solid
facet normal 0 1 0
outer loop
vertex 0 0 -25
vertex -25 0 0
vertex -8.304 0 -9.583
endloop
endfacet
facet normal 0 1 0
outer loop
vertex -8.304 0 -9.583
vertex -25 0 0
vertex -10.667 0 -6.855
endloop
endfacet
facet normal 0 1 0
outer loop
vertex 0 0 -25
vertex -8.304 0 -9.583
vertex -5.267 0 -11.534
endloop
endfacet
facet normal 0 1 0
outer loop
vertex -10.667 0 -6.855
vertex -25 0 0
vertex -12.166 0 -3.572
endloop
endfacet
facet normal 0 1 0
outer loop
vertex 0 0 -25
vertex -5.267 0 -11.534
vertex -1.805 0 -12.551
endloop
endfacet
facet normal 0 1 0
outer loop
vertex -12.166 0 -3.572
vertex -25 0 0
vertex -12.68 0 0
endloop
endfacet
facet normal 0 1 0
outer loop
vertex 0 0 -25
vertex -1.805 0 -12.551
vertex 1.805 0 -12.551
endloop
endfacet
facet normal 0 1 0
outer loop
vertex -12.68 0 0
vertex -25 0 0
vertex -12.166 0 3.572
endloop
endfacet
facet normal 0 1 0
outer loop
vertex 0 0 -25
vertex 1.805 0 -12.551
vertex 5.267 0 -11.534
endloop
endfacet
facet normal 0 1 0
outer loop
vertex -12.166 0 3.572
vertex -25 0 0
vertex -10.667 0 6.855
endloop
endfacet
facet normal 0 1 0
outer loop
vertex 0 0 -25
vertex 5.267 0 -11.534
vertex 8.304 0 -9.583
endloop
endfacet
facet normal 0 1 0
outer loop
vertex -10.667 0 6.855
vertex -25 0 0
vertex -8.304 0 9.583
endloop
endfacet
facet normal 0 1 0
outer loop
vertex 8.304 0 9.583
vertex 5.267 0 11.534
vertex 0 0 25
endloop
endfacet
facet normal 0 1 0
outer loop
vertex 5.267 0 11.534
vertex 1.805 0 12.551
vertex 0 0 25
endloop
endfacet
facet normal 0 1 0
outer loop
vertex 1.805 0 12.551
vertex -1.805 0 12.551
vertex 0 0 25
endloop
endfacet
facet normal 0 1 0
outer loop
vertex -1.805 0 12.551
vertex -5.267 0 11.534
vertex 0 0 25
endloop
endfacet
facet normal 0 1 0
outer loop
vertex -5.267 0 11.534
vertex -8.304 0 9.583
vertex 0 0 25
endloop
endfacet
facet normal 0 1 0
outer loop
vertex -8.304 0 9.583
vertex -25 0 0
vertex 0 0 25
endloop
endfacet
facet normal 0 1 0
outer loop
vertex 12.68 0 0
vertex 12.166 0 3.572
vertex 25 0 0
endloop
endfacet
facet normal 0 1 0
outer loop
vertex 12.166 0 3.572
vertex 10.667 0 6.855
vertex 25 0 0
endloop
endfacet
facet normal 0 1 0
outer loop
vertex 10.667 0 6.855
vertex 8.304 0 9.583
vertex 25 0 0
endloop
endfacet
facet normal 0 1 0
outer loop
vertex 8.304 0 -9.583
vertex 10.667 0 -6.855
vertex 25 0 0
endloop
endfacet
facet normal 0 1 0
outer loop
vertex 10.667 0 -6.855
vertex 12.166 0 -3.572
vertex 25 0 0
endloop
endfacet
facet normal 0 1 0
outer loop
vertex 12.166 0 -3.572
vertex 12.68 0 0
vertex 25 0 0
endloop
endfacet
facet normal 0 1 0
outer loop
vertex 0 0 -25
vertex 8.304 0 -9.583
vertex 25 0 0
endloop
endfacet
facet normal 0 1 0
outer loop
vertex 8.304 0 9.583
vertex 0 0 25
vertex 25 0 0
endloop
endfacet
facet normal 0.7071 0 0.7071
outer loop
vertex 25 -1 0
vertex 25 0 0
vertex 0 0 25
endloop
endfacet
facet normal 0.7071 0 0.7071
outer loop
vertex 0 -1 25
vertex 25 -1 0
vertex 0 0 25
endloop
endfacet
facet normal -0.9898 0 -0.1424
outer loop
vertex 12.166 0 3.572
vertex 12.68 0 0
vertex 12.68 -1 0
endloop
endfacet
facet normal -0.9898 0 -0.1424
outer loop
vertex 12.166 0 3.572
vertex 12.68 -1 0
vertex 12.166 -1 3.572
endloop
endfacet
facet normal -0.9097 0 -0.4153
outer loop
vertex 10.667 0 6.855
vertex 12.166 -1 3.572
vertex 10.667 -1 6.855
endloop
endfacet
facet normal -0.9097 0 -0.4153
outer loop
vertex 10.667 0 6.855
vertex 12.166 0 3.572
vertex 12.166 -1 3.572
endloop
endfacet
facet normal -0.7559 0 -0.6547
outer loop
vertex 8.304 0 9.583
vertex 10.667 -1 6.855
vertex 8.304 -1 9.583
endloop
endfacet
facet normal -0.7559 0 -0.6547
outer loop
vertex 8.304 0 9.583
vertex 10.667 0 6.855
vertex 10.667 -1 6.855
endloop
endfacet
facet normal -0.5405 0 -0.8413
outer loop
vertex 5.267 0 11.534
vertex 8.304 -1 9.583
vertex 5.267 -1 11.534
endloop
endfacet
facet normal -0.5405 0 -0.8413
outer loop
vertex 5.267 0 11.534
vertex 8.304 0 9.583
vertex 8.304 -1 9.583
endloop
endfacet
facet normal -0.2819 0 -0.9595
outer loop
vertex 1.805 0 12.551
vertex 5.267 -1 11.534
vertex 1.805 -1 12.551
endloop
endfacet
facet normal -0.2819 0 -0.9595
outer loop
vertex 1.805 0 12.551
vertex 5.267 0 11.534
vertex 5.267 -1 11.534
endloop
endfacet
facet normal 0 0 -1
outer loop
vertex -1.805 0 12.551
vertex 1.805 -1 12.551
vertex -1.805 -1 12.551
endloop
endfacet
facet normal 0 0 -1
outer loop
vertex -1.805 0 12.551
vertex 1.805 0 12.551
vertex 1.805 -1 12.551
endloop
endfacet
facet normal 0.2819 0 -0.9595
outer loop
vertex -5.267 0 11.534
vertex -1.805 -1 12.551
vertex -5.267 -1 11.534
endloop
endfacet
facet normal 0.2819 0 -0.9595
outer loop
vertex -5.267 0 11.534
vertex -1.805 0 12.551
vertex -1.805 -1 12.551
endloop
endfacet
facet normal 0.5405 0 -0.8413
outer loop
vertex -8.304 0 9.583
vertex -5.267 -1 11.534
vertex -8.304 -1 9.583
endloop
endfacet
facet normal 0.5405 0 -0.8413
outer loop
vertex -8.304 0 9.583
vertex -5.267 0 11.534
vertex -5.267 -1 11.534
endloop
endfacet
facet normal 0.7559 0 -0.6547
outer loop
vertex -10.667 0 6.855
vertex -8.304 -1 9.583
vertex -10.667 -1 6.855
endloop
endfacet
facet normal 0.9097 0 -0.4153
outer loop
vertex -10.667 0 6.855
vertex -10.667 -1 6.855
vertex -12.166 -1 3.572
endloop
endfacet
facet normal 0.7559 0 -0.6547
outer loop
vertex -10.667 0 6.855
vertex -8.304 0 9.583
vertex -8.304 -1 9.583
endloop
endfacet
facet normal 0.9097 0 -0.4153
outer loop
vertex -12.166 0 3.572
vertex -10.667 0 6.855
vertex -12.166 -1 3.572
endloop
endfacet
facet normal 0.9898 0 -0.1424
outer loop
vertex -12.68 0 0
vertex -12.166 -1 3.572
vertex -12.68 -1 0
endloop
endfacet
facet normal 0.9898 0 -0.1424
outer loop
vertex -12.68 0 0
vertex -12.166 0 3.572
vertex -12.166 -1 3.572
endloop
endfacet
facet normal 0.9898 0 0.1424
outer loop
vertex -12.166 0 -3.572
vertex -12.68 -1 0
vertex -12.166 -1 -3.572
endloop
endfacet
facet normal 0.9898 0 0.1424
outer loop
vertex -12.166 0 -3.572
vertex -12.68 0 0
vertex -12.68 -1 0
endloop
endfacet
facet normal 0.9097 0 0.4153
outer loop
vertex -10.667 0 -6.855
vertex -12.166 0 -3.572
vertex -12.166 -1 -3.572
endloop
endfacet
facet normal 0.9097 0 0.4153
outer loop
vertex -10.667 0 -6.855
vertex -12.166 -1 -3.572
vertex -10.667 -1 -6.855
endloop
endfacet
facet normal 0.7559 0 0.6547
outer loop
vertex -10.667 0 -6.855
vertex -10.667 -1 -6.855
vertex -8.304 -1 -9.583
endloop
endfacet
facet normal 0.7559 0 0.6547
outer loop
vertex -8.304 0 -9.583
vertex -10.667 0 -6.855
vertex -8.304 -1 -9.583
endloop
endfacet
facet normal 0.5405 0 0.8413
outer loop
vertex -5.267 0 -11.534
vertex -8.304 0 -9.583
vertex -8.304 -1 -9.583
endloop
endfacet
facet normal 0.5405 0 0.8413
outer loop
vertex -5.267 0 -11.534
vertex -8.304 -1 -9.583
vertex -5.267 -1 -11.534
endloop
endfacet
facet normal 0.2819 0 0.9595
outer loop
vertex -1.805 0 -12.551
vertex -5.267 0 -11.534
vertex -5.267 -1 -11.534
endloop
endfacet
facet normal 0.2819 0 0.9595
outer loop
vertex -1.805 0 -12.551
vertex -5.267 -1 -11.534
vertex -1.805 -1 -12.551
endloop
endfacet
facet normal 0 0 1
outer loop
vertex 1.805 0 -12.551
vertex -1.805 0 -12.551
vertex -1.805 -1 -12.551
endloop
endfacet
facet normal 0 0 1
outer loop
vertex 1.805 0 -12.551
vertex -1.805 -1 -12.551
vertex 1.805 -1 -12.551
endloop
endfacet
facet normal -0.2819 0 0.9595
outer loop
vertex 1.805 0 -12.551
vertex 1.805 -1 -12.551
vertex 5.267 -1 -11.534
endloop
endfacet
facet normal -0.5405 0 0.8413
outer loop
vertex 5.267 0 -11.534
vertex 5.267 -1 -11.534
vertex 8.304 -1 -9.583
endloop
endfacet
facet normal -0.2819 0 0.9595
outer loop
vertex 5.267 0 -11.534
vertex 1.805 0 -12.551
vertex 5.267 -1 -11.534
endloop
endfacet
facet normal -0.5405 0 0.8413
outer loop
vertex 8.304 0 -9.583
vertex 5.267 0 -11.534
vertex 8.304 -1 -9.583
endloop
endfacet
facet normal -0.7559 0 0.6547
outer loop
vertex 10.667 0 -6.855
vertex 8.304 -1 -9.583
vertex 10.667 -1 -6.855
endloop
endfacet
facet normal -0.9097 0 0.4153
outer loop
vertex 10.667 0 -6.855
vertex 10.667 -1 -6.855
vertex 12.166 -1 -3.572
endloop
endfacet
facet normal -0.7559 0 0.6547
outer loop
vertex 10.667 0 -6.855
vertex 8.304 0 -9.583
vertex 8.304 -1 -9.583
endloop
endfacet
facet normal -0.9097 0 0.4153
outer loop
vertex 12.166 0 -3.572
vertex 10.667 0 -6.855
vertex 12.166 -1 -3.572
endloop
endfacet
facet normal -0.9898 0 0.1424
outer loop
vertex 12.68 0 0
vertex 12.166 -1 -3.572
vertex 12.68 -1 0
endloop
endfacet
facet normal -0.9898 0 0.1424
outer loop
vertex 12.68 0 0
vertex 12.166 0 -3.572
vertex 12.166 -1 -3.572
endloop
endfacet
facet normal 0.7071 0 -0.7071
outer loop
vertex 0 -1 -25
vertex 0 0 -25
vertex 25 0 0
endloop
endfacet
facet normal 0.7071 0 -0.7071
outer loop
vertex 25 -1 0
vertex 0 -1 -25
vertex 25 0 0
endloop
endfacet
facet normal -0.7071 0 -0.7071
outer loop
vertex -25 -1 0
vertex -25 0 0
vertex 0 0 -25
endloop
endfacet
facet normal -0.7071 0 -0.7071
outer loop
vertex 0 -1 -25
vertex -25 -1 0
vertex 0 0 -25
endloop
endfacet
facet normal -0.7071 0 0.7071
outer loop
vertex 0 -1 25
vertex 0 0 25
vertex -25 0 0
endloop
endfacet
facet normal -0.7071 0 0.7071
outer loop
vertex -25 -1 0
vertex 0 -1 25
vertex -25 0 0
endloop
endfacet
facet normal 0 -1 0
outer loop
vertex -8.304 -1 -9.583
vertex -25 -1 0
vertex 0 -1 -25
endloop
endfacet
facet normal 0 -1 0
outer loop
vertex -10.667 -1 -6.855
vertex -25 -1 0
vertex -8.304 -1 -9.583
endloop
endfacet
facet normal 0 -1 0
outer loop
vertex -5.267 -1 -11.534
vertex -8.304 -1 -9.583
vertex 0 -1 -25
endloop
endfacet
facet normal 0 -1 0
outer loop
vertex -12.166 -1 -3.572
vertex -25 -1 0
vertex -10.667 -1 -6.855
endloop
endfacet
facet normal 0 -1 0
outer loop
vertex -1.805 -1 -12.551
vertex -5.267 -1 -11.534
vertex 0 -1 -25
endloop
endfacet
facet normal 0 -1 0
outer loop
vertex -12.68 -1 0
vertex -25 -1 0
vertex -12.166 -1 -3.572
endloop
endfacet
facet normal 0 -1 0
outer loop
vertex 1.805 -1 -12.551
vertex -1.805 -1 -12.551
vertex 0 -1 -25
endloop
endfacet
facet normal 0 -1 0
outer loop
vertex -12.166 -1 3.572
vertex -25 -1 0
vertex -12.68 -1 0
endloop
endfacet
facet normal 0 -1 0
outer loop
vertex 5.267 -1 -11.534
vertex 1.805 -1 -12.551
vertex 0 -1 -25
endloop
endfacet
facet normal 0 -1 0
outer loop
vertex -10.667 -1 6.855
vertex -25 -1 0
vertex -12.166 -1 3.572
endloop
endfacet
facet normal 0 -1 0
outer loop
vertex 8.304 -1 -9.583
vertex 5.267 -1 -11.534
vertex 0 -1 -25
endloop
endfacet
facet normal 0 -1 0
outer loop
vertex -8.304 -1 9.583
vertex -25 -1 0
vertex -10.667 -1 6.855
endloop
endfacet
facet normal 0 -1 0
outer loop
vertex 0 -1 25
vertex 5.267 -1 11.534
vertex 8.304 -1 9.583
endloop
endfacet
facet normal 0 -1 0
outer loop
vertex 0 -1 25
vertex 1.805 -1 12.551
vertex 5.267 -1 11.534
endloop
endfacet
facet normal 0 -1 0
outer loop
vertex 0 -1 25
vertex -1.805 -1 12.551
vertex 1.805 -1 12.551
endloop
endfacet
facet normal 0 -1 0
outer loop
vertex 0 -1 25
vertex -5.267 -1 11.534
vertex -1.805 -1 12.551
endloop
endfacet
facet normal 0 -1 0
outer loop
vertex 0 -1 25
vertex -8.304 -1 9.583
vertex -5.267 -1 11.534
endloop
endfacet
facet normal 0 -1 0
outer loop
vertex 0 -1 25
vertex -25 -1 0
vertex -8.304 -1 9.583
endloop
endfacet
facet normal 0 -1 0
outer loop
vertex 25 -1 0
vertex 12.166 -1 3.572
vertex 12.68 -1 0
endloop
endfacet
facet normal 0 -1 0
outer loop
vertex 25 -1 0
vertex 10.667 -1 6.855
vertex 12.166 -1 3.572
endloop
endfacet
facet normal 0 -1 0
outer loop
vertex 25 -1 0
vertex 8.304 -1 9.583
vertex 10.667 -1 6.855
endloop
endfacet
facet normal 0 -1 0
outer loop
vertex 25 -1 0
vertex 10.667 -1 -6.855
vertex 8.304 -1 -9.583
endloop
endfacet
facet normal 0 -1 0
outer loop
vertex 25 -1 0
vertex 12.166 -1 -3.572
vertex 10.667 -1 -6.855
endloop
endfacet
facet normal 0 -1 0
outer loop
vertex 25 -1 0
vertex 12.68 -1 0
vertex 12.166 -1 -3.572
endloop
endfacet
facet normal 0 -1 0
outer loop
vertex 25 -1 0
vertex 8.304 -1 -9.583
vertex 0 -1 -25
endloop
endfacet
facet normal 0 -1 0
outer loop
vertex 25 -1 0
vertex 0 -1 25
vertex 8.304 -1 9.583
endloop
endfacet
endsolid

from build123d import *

# Parameters (mm, degrees)
F0_R     = 12.679986
F1_DEPTH = 1


with BuildPart() as f1:
    # F0 (on Front) → F1 (new body)
    with BuildSketch(Plane.XZ):
        Polygon((0, 25), (-25, 0), (0, -25), (25, 0), align=None)
        Circle(F0_R, mode=Mode.SUBTRACT)
    extrude(amount=F1_DEPTH)


solid = f1.part
